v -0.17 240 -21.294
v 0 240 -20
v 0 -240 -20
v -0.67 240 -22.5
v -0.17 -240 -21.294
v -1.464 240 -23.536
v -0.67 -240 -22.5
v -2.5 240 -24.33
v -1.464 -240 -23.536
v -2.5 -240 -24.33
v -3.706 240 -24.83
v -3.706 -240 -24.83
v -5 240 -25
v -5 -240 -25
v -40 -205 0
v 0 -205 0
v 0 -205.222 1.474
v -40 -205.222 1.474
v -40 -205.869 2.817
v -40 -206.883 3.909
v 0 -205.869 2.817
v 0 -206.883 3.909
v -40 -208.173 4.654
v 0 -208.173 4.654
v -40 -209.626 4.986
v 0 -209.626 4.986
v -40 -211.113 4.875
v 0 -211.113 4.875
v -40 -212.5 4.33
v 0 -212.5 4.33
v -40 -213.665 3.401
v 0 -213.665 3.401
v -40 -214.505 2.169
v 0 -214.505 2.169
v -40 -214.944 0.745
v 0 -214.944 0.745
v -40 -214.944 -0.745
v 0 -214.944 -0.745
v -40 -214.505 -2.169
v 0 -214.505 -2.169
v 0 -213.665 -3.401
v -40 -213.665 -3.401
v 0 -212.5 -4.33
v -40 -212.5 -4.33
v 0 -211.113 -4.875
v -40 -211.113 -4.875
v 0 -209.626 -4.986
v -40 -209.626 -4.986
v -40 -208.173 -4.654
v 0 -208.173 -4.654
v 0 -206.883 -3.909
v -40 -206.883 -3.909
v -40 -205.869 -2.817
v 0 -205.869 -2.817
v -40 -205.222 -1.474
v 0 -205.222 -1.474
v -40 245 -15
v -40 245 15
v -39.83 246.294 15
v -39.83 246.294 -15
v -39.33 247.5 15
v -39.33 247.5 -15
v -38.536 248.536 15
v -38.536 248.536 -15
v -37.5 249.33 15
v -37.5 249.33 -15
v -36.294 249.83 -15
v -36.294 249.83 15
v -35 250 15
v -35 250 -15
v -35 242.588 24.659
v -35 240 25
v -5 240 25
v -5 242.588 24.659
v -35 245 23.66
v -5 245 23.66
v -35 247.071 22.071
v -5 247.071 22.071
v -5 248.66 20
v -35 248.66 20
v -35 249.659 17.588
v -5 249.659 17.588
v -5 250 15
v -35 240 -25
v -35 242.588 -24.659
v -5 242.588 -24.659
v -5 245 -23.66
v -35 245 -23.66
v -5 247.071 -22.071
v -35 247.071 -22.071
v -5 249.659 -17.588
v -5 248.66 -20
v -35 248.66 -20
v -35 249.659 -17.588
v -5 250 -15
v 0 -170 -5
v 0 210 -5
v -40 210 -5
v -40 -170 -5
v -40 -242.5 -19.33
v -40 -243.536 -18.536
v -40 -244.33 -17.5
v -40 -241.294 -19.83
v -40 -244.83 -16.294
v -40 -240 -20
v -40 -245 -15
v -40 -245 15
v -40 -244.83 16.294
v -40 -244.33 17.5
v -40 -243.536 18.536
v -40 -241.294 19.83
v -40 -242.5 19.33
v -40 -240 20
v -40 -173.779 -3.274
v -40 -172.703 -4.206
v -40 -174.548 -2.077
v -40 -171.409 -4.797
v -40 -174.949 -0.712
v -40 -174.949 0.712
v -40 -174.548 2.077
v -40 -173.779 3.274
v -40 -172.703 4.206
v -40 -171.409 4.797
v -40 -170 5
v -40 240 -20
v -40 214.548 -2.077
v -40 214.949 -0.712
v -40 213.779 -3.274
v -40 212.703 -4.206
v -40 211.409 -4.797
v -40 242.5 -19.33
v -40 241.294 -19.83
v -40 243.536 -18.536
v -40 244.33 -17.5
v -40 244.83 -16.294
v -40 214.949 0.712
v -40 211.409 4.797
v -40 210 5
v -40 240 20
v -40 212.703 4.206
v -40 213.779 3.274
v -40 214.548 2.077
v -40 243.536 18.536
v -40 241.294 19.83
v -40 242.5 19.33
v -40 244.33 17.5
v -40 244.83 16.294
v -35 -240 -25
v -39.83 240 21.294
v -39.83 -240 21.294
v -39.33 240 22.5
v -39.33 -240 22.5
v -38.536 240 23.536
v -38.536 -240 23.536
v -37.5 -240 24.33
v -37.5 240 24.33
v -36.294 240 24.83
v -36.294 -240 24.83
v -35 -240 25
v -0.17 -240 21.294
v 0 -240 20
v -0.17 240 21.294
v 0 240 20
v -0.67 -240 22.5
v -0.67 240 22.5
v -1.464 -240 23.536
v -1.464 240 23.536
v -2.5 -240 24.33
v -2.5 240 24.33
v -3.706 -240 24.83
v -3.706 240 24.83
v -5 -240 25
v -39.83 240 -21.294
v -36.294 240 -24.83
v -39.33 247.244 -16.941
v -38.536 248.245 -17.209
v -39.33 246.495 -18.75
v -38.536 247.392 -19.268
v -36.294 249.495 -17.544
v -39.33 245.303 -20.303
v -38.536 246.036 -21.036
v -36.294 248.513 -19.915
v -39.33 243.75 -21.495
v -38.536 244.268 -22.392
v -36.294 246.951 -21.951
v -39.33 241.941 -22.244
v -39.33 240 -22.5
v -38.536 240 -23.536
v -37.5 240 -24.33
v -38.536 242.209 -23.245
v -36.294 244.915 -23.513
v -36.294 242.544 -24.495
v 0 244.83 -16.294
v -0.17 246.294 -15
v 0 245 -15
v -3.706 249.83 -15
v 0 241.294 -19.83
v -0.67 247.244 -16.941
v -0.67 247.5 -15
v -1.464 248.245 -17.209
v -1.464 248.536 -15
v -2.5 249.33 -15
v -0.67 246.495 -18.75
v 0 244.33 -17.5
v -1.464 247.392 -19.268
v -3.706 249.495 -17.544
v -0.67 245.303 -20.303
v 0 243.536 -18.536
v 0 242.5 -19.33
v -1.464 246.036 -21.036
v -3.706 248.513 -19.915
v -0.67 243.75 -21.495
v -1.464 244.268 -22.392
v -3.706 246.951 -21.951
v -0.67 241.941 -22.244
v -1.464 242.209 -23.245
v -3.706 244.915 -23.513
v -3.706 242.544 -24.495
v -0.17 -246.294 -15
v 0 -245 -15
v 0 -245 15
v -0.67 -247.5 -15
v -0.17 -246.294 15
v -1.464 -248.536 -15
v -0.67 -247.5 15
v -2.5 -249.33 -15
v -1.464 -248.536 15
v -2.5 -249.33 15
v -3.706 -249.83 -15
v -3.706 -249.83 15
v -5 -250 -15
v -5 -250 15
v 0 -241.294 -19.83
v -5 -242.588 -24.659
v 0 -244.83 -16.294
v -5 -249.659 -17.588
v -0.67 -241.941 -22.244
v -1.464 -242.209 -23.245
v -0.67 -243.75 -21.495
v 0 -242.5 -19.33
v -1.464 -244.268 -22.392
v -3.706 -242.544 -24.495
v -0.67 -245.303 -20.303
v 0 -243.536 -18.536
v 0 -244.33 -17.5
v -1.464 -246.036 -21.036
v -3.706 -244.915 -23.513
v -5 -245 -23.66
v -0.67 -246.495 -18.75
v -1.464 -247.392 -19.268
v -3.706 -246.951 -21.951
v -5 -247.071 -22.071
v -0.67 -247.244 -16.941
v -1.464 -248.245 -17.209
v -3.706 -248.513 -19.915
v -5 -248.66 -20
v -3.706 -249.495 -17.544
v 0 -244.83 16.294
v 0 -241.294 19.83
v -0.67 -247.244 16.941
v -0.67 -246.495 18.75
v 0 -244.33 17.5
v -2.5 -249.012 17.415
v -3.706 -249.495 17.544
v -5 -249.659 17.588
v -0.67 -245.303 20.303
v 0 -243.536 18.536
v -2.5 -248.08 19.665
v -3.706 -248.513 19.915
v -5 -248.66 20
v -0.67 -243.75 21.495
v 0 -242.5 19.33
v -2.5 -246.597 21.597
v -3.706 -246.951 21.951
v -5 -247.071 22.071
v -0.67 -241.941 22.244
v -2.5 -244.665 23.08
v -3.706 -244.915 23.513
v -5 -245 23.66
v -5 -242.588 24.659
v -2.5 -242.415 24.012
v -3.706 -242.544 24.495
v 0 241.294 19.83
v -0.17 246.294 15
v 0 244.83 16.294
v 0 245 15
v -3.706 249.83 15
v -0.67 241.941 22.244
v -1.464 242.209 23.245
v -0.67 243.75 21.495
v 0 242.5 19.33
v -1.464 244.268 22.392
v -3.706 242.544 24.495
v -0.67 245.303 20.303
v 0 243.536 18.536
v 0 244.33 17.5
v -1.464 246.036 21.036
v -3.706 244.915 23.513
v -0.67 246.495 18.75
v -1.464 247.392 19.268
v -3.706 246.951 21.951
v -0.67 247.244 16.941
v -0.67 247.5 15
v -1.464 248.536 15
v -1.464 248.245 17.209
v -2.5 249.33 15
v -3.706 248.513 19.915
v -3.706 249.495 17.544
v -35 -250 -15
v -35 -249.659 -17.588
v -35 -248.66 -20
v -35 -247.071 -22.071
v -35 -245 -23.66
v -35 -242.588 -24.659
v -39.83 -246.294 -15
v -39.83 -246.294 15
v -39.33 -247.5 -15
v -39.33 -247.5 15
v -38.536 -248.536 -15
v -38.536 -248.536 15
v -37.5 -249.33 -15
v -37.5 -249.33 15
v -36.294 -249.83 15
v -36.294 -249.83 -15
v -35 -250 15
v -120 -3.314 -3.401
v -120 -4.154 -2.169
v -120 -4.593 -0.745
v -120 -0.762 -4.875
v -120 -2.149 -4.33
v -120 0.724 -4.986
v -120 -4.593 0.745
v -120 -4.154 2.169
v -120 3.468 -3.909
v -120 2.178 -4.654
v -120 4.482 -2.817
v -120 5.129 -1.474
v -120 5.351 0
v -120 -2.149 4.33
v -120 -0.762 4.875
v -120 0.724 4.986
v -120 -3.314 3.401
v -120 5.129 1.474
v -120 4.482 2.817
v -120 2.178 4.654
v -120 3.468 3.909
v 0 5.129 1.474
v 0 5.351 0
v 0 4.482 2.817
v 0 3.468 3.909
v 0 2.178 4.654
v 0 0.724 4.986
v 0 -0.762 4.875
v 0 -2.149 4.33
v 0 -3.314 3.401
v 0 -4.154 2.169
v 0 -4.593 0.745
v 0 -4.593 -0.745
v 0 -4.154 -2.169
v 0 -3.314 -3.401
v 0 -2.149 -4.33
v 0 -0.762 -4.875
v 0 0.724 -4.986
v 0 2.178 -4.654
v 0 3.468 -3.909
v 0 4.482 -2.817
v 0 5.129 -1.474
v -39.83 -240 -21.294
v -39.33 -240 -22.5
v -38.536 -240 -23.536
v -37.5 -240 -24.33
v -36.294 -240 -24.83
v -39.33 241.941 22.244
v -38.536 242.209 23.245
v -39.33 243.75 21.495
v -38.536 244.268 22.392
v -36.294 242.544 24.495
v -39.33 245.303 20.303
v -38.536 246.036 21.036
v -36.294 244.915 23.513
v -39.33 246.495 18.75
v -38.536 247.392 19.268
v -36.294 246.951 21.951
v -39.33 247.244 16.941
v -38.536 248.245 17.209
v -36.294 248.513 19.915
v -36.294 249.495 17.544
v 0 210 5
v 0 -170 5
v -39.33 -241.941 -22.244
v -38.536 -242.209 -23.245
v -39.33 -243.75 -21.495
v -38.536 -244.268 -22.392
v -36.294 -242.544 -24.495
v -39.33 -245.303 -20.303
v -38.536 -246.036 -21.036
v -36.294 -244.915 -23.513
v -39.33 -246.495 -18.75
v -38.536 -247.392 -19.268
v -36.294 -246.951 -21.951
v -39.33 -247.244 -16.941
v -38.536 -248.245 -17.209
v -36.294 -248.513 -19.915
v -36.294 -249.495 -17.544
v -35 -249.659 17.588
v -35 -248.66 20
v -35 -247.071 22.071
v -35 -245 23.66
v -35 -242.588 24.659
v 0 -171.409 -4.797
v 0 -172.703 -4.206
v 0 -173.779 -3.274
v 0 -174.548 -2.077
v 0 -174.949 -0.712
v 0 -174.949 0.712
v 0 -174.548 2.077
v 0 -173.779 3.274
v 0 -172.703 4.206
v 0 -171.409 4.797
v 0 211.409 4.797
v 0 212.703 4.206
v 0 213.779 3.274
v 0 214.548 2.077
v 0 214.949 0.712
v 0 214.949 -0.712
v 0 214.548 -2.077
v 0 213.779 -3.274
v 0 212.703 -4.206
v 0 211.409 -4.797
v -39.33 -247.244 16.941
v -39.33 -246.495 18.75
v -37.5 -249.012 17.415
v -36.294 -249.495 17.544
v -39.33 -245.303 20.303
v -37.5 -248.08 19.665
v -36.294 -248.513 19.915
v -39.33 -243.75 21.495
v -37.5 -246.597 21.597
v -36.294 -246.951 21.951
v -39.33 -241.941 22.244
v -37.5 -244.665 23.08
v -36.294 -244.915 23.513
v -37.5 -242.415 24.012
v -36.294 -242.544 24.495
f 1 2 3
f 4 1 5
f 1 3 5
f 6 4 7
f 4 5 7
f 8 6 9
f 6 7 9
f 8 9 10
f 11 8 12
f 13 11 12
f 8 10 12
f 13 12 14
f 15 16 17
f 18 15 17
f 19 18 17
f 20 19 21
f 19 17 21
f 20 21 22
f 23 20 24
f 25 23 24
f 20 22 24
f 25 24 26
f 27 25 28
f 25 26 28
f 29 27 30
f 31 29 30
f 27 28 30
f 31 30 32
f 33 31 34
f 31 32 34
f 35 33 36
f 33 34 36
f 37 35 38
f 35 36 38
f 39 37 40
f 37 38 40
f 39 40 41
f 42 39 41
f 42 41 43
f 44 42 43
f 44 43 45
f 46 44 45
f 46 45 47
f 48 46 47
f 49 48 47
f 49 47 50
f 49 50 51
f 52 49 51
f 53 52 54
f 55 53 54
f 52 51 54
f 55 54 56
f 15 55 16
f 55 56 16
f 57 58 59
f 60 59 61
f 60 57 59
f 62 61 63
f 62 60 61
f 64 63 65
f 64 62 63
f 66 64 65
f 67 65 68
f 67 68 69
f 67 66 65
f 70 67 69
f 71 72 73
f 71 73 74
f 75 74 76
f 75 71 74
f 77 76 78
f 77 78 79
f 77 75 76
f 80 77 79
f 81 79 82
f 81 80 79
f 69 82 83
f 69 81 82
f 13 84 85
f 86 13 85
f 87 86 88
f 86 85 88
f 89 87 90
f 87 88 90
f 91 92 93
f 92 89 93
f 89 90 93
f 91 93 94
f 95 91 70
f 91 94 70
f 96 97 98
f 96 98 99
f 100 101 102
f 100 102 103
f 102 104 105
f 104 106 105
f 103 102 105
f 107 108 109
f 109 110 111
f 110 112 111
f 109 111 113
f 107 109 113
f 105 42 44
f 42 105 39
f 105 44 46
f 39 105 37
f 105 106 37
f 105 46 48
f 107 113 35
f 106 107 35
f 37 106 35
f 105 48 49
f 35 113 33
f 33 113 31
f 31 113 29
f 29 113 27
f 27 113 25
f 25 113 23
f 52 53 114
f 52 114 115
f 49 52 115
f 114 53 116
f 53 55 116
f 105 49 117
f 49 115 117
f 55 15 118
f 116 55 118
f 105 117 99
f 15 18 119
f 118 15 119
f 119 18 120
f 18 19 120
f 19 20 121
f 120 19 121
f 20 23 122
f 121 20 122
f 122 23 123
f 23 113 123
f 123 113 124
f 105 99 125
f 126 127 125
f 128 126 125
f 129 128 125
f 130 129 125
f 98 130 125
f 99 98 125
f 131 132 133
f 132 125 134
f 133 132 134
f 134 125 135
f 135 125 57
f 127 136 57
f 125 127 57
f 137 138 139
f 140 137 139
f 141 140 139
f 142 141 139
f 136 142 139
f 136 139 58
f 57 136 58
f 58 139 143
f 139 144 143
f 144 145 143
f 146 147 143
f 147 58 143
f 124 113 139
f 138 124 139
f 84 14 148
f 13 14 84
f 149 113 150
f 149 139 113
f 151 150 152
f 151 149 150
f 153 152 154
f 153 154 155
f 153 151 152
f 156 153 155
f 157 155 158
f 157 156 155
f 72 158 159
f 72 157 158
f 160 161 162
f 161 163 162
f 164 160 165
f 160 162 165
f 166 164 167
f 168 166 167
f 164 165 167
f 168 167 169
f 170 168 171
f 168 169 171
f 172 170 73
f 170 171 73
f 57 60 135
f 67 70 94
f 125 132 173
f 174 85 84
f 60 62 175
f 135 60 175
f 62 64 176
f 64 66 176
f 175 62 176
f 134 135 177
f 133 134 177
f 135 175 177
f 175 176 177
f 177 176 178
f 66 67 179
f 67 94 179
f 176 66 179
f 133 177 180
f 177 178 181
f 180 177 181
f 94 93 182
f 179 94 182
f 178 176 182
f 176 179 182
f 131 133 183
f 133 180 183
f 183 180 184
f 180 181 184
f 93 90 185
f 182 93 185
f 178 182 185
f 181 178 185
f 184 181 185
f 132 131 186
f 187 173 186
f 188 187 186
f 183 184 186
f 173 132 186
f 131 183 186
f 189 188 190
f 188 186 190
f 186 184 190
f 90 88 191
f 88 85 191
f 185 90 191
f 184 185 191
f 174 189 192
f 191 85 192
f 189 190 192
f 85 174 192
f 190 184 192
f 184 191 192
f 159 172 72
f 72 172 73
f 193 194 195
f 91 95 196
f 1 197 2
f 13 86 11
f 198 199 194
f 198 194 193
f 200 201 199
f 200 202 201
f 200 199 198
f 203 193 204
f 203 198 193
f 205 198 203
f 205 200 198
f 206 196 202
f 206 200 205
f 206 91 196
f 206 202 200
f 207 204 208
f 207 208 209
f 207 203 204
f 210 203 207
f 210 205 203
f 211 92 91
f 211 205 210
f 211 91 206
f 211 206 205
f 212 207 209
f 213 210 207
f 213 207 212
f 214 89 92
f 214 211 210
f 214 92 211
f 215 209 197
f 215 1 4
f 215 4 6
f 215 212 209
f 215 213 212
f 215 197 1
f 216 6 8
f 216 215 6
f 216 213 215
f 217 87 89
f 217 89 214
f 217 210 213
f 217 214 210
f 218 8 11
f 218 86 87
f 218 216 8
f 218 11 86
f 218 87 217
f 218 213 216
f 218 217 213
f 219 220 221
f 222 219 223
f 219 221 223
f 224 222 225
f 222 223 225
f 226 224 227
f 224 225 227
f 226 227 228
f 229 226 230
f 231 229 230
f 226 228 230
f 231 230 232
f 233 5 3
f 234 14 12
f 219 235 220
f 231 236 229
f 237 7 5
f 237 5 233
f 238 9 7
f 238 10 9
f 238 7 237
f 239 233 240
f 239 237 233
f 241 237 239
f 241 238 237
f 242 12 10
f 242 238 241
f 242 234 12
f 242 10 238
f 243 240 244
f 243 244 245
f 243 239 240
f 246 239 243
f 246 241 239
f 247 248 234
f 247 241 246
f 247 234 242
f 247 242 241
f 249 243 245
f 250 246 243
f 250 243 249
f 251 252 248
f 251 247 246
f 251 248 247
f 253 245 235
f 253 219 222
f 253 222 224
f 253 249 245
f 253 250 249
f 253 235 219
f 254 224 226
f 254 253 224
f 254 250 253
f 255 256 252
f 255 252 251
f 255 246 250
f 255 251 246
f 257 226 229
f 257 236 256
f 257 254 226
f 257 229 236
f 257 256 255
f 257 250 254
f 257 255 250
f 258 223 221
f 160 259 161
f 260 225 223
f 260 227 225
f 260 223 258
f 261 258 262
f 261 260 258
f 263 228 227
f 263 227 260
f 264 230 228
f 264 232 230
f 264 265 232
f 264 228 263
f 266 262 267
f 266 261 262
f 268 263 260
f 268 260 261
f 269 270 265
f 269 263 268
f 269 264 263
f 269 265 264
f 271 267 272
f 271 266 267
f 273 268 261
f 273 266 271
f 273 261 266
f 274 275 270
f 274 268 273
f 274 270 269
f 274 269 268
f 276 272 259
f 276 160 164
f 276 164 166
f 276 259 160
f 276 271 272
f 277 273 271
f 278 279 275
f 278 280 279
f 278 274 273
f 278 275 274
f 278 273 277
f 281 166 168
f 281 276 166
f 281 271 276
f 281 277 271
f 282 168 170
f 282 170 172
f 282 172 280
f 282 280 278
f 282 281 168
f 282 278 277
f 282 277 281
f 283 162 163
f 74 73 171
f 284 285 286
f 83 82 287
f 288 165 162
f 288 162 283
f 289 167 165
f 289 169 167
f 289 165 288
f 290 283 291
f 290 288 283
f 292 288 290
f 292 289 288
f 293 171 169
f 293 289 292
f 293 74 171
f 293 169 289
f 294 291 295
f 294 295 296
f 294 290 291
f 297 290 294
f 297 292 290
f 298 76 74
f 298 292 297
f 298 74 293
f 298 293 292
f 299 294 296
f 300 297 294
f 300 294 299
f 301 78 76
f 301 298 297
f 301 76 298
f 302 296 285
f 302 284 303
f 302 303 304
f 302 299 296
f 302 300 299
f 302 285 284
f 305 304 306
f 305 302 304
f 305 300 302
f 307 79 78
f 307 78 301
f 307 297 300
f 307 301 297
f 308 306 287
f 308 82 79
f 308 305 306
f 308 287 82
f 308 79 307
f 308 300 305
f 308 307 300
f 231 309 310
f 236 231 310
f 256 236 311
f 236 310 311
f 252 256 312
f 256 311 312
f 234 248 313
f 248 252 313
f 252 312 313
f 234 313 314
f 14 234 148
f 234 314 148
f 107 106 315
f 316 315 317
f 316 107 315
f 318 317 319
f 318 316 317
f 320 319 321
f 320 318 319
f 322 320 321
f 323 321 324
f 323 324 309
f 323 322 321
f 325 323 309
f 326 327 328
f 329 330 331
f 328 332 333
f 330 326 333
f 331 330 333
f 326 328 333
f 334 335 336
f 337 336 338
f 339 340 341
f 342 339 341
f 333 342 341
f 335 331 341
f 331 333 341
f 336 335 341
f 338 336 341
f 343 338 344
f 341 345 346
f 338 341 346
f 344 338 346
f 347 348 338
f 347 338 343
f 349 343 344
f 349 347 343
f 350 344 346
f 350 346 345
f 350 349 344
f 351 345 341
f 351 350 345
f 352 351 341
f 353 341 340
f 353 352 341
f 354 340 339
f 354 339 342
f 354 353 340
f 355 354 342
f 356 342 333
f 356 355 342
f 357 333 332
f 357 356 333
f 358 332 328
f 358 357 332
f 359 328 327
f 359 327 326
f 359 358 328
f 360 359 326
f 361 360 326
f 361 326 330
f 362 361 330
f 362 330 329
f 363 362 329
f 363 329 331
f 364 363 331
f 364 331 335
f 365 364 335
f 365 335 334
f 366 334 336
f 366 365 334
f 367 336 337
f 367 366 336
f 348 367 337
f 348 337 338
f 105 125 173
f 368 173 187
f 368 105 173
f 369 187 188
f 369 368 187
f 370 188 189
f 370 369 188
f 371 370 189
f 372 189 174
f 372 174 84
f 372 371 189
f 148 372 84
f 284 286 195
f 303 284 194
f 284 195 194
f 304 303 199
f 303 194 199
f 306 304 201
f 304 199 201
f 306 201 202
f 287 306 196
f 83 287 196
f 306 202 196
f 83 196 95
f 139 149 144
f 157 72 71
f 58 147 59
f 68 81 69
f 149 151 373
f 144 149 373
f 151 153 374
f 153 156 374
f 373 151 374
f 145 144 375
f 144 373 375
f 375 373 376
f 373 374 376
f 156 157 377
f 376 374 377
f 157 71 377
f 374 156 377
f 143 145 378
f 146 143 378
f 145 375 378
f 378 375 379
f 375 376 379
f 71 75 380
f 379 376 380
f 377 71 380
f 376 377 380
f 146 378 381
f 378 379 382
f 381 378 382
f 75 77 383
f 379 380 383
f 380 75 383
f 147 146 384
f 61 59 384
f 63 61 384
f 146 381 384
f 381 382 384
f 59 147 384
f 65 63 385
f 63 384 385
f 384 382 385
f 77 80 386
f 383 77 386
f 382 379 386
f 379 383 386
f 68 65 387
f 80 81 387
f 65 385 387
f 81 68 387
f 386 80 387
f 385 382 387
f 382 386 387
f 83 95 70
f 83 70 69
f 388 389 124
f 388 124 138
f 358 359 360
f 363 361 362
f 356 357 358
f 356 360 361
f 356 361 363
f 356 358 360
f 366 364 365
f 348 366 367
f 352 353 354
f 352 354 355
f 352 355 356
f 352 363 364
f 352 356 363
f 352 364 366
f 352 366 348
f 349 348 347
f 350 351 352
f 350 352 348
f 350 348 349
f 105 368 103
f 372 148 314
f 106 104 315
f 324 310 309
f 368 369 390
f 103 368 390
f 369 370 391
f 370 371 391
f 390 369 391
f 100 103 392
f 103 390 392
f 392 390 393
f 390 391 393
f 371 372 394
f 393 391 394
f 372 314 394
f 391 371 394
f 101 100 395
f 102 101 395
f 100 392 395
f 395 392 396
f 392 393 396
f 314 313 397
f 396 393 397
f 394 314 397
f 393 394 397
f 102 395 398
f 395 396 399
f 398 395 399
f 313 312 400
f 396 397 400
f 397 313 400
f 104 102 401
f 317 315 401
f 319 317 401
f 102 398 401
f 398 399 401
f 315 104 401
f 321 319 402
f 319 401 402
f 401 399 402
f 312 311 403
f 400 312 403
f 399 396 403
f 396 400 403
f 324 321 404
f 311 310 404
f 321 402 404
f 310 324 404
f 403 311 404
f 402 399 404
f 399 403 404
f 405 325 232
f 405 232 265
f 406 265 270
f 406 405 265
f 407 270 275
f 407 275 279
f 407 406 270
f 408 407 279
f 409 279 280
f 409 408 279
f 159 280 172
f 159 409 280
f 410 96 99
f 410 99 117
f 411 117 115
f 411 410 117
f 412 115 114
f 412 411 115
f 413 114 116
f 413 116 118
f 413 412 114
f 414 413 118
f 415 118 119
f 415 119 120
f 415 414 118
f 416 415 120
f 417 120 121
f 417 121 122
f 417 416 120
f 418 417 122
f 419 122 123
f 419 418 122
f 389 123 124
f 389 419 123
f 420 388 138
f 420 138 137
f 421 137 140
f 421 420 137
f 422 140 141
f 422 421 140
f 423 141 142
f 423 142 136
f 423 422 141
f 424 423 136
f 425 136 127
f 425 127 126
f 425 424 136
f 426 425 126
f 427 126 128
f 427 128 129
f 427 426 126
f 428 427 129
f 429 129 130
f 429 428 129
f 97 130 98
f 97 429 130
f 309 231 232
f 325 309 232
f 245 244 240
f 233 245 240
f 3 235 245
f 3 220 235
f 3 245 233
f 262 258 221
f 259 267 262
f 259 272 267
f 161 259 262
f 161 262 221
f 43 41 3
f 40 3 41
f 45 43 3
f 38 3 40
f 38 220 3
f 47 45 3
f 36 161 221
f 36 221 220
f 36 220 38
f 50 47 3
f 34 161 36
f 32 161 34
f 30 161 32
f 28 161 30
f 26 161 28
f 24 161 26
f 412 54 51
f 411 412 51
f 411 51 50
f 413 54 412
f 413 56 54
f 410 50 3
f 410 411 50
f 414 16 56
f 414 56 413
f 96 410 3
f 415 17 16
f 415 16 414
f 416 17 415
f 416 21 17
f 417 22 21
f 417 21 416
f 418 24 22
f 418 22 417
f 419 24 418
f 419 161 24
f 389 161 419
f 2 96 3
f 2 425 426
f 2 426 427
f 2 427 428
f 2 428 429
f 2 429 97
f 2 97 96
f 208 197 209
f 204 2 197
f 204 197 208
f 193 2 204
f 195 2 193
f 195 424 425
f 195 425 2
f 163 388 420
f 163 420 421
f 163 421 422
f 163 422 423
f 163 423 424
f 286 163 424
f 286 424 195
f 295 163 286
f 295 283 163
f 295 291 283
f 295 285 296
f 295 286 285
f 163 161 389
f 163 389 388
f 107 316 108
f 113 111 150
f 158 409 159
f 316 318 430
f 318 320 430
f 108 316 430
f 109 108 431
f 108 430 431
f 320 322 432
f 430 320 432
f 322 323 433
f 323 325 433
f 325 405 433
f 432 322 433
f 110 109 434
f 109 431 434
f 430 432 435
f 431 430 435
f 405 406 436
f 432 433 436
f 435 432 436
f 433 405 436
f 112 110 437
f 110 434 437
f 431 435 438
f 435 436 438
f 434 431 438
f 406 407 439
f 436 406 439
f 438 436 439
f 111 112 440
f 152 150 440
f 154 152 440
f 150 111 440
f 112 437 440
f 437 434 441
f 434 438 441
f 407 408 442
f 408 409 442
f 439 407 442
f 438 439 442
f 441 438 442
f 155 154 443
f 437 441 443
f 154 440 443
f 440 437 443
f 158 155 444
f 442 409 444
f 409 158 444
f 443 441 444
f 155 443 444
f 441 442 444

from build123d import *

# Parameters (mm, degrees)
F0_W     = 500
F0_H     = 50
F0_R     = 5
F1_DEPTH = 40
F2_R     = 10
F3_R     = 5
F4_R     = 5
F5_DEPTH = 120


with BuildPart() as f1:
    # F0 (on Right) → F1 (new body)
    with BuildSketch(Plane.YZ):
        Rectangle(F0_W, F0_H)
        with Locations((-210, 0)):
            Circle(F0_R, mode=Mode.SUBTRACT)
        with BuildLine():
            Line((210, -5), (-170, -5))
            ThreePointArc((-170, -5), (-175, 0), (-170, 5))
            Line((-170, 5), (210, 5))
            ThreePointArc((210, 5), (215, 0), (210, -5))
        make_face(mode=Mode.SUBTRACT)
    extrude(amount=-F1_DEPTH)

    # F2
    f2_edges = [f1.edges().sort_by_distance(p)[0] for p in [
        (-20, -250, 25),
        (-20, -250, -25),
        (-20, 250, 25),
        (-20, 250, -25),
    ]]
    fillet(f2_edges, radius=F2_R)

    # F3
    f3_edges = [f1.edges().sort_by_distance(p)[0] for p in [
        (0, 0, 25),
        (-40, 0, 25),
    ]]
    fillet(f3_edges, radius=F3_R)


with BuildPart() as f5:
    # F4 (on Right) → F5 (new body)
    with BuildSketch(Plane.YZ):
        with Locations((0.350837, 0)):
            Circle(F4_R)
    extrude(amount=-F5_DEPTH)


solid = Compound([f1.part, f5.part])
